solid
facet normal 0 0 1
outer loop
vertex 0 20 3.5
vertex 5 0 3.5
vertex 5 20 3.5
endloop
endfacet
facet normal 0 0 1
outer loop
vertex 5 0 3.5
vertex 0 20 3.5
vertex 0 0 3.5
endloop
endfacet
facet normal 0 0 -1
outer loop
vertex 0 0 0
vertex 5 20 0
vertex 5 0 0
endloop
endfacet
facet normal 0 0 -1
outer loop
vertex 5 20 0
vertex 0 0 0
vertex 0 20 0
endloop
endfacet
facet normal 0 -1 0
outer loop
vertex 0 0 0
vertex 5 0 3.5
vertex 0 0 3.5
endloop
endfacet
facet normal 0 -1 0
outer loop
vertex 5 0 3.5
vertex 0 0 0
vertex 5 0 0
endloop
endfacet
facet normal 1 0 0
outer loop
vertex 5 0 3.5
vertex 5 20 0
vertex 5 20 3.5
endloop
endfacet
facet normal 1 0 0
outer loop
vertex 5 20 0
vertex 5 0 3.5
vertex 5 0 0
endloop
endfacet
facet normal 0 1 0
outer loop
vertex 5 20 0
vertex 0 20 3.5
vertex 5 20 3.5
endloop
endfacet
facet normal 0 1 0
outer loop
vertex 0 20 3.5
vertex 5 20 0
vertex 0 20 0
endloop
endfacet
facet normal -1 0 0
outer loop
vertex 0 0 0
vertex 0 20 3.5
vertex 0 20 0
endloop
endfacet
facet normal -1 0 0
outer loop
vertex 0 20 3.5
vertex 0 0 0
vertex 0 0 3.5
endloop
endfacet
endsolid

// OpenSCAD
hole_x = 5;
hole_y = 20;
hole_z = 3.5;

cube([hole_x, hole_y, hole_z]);
